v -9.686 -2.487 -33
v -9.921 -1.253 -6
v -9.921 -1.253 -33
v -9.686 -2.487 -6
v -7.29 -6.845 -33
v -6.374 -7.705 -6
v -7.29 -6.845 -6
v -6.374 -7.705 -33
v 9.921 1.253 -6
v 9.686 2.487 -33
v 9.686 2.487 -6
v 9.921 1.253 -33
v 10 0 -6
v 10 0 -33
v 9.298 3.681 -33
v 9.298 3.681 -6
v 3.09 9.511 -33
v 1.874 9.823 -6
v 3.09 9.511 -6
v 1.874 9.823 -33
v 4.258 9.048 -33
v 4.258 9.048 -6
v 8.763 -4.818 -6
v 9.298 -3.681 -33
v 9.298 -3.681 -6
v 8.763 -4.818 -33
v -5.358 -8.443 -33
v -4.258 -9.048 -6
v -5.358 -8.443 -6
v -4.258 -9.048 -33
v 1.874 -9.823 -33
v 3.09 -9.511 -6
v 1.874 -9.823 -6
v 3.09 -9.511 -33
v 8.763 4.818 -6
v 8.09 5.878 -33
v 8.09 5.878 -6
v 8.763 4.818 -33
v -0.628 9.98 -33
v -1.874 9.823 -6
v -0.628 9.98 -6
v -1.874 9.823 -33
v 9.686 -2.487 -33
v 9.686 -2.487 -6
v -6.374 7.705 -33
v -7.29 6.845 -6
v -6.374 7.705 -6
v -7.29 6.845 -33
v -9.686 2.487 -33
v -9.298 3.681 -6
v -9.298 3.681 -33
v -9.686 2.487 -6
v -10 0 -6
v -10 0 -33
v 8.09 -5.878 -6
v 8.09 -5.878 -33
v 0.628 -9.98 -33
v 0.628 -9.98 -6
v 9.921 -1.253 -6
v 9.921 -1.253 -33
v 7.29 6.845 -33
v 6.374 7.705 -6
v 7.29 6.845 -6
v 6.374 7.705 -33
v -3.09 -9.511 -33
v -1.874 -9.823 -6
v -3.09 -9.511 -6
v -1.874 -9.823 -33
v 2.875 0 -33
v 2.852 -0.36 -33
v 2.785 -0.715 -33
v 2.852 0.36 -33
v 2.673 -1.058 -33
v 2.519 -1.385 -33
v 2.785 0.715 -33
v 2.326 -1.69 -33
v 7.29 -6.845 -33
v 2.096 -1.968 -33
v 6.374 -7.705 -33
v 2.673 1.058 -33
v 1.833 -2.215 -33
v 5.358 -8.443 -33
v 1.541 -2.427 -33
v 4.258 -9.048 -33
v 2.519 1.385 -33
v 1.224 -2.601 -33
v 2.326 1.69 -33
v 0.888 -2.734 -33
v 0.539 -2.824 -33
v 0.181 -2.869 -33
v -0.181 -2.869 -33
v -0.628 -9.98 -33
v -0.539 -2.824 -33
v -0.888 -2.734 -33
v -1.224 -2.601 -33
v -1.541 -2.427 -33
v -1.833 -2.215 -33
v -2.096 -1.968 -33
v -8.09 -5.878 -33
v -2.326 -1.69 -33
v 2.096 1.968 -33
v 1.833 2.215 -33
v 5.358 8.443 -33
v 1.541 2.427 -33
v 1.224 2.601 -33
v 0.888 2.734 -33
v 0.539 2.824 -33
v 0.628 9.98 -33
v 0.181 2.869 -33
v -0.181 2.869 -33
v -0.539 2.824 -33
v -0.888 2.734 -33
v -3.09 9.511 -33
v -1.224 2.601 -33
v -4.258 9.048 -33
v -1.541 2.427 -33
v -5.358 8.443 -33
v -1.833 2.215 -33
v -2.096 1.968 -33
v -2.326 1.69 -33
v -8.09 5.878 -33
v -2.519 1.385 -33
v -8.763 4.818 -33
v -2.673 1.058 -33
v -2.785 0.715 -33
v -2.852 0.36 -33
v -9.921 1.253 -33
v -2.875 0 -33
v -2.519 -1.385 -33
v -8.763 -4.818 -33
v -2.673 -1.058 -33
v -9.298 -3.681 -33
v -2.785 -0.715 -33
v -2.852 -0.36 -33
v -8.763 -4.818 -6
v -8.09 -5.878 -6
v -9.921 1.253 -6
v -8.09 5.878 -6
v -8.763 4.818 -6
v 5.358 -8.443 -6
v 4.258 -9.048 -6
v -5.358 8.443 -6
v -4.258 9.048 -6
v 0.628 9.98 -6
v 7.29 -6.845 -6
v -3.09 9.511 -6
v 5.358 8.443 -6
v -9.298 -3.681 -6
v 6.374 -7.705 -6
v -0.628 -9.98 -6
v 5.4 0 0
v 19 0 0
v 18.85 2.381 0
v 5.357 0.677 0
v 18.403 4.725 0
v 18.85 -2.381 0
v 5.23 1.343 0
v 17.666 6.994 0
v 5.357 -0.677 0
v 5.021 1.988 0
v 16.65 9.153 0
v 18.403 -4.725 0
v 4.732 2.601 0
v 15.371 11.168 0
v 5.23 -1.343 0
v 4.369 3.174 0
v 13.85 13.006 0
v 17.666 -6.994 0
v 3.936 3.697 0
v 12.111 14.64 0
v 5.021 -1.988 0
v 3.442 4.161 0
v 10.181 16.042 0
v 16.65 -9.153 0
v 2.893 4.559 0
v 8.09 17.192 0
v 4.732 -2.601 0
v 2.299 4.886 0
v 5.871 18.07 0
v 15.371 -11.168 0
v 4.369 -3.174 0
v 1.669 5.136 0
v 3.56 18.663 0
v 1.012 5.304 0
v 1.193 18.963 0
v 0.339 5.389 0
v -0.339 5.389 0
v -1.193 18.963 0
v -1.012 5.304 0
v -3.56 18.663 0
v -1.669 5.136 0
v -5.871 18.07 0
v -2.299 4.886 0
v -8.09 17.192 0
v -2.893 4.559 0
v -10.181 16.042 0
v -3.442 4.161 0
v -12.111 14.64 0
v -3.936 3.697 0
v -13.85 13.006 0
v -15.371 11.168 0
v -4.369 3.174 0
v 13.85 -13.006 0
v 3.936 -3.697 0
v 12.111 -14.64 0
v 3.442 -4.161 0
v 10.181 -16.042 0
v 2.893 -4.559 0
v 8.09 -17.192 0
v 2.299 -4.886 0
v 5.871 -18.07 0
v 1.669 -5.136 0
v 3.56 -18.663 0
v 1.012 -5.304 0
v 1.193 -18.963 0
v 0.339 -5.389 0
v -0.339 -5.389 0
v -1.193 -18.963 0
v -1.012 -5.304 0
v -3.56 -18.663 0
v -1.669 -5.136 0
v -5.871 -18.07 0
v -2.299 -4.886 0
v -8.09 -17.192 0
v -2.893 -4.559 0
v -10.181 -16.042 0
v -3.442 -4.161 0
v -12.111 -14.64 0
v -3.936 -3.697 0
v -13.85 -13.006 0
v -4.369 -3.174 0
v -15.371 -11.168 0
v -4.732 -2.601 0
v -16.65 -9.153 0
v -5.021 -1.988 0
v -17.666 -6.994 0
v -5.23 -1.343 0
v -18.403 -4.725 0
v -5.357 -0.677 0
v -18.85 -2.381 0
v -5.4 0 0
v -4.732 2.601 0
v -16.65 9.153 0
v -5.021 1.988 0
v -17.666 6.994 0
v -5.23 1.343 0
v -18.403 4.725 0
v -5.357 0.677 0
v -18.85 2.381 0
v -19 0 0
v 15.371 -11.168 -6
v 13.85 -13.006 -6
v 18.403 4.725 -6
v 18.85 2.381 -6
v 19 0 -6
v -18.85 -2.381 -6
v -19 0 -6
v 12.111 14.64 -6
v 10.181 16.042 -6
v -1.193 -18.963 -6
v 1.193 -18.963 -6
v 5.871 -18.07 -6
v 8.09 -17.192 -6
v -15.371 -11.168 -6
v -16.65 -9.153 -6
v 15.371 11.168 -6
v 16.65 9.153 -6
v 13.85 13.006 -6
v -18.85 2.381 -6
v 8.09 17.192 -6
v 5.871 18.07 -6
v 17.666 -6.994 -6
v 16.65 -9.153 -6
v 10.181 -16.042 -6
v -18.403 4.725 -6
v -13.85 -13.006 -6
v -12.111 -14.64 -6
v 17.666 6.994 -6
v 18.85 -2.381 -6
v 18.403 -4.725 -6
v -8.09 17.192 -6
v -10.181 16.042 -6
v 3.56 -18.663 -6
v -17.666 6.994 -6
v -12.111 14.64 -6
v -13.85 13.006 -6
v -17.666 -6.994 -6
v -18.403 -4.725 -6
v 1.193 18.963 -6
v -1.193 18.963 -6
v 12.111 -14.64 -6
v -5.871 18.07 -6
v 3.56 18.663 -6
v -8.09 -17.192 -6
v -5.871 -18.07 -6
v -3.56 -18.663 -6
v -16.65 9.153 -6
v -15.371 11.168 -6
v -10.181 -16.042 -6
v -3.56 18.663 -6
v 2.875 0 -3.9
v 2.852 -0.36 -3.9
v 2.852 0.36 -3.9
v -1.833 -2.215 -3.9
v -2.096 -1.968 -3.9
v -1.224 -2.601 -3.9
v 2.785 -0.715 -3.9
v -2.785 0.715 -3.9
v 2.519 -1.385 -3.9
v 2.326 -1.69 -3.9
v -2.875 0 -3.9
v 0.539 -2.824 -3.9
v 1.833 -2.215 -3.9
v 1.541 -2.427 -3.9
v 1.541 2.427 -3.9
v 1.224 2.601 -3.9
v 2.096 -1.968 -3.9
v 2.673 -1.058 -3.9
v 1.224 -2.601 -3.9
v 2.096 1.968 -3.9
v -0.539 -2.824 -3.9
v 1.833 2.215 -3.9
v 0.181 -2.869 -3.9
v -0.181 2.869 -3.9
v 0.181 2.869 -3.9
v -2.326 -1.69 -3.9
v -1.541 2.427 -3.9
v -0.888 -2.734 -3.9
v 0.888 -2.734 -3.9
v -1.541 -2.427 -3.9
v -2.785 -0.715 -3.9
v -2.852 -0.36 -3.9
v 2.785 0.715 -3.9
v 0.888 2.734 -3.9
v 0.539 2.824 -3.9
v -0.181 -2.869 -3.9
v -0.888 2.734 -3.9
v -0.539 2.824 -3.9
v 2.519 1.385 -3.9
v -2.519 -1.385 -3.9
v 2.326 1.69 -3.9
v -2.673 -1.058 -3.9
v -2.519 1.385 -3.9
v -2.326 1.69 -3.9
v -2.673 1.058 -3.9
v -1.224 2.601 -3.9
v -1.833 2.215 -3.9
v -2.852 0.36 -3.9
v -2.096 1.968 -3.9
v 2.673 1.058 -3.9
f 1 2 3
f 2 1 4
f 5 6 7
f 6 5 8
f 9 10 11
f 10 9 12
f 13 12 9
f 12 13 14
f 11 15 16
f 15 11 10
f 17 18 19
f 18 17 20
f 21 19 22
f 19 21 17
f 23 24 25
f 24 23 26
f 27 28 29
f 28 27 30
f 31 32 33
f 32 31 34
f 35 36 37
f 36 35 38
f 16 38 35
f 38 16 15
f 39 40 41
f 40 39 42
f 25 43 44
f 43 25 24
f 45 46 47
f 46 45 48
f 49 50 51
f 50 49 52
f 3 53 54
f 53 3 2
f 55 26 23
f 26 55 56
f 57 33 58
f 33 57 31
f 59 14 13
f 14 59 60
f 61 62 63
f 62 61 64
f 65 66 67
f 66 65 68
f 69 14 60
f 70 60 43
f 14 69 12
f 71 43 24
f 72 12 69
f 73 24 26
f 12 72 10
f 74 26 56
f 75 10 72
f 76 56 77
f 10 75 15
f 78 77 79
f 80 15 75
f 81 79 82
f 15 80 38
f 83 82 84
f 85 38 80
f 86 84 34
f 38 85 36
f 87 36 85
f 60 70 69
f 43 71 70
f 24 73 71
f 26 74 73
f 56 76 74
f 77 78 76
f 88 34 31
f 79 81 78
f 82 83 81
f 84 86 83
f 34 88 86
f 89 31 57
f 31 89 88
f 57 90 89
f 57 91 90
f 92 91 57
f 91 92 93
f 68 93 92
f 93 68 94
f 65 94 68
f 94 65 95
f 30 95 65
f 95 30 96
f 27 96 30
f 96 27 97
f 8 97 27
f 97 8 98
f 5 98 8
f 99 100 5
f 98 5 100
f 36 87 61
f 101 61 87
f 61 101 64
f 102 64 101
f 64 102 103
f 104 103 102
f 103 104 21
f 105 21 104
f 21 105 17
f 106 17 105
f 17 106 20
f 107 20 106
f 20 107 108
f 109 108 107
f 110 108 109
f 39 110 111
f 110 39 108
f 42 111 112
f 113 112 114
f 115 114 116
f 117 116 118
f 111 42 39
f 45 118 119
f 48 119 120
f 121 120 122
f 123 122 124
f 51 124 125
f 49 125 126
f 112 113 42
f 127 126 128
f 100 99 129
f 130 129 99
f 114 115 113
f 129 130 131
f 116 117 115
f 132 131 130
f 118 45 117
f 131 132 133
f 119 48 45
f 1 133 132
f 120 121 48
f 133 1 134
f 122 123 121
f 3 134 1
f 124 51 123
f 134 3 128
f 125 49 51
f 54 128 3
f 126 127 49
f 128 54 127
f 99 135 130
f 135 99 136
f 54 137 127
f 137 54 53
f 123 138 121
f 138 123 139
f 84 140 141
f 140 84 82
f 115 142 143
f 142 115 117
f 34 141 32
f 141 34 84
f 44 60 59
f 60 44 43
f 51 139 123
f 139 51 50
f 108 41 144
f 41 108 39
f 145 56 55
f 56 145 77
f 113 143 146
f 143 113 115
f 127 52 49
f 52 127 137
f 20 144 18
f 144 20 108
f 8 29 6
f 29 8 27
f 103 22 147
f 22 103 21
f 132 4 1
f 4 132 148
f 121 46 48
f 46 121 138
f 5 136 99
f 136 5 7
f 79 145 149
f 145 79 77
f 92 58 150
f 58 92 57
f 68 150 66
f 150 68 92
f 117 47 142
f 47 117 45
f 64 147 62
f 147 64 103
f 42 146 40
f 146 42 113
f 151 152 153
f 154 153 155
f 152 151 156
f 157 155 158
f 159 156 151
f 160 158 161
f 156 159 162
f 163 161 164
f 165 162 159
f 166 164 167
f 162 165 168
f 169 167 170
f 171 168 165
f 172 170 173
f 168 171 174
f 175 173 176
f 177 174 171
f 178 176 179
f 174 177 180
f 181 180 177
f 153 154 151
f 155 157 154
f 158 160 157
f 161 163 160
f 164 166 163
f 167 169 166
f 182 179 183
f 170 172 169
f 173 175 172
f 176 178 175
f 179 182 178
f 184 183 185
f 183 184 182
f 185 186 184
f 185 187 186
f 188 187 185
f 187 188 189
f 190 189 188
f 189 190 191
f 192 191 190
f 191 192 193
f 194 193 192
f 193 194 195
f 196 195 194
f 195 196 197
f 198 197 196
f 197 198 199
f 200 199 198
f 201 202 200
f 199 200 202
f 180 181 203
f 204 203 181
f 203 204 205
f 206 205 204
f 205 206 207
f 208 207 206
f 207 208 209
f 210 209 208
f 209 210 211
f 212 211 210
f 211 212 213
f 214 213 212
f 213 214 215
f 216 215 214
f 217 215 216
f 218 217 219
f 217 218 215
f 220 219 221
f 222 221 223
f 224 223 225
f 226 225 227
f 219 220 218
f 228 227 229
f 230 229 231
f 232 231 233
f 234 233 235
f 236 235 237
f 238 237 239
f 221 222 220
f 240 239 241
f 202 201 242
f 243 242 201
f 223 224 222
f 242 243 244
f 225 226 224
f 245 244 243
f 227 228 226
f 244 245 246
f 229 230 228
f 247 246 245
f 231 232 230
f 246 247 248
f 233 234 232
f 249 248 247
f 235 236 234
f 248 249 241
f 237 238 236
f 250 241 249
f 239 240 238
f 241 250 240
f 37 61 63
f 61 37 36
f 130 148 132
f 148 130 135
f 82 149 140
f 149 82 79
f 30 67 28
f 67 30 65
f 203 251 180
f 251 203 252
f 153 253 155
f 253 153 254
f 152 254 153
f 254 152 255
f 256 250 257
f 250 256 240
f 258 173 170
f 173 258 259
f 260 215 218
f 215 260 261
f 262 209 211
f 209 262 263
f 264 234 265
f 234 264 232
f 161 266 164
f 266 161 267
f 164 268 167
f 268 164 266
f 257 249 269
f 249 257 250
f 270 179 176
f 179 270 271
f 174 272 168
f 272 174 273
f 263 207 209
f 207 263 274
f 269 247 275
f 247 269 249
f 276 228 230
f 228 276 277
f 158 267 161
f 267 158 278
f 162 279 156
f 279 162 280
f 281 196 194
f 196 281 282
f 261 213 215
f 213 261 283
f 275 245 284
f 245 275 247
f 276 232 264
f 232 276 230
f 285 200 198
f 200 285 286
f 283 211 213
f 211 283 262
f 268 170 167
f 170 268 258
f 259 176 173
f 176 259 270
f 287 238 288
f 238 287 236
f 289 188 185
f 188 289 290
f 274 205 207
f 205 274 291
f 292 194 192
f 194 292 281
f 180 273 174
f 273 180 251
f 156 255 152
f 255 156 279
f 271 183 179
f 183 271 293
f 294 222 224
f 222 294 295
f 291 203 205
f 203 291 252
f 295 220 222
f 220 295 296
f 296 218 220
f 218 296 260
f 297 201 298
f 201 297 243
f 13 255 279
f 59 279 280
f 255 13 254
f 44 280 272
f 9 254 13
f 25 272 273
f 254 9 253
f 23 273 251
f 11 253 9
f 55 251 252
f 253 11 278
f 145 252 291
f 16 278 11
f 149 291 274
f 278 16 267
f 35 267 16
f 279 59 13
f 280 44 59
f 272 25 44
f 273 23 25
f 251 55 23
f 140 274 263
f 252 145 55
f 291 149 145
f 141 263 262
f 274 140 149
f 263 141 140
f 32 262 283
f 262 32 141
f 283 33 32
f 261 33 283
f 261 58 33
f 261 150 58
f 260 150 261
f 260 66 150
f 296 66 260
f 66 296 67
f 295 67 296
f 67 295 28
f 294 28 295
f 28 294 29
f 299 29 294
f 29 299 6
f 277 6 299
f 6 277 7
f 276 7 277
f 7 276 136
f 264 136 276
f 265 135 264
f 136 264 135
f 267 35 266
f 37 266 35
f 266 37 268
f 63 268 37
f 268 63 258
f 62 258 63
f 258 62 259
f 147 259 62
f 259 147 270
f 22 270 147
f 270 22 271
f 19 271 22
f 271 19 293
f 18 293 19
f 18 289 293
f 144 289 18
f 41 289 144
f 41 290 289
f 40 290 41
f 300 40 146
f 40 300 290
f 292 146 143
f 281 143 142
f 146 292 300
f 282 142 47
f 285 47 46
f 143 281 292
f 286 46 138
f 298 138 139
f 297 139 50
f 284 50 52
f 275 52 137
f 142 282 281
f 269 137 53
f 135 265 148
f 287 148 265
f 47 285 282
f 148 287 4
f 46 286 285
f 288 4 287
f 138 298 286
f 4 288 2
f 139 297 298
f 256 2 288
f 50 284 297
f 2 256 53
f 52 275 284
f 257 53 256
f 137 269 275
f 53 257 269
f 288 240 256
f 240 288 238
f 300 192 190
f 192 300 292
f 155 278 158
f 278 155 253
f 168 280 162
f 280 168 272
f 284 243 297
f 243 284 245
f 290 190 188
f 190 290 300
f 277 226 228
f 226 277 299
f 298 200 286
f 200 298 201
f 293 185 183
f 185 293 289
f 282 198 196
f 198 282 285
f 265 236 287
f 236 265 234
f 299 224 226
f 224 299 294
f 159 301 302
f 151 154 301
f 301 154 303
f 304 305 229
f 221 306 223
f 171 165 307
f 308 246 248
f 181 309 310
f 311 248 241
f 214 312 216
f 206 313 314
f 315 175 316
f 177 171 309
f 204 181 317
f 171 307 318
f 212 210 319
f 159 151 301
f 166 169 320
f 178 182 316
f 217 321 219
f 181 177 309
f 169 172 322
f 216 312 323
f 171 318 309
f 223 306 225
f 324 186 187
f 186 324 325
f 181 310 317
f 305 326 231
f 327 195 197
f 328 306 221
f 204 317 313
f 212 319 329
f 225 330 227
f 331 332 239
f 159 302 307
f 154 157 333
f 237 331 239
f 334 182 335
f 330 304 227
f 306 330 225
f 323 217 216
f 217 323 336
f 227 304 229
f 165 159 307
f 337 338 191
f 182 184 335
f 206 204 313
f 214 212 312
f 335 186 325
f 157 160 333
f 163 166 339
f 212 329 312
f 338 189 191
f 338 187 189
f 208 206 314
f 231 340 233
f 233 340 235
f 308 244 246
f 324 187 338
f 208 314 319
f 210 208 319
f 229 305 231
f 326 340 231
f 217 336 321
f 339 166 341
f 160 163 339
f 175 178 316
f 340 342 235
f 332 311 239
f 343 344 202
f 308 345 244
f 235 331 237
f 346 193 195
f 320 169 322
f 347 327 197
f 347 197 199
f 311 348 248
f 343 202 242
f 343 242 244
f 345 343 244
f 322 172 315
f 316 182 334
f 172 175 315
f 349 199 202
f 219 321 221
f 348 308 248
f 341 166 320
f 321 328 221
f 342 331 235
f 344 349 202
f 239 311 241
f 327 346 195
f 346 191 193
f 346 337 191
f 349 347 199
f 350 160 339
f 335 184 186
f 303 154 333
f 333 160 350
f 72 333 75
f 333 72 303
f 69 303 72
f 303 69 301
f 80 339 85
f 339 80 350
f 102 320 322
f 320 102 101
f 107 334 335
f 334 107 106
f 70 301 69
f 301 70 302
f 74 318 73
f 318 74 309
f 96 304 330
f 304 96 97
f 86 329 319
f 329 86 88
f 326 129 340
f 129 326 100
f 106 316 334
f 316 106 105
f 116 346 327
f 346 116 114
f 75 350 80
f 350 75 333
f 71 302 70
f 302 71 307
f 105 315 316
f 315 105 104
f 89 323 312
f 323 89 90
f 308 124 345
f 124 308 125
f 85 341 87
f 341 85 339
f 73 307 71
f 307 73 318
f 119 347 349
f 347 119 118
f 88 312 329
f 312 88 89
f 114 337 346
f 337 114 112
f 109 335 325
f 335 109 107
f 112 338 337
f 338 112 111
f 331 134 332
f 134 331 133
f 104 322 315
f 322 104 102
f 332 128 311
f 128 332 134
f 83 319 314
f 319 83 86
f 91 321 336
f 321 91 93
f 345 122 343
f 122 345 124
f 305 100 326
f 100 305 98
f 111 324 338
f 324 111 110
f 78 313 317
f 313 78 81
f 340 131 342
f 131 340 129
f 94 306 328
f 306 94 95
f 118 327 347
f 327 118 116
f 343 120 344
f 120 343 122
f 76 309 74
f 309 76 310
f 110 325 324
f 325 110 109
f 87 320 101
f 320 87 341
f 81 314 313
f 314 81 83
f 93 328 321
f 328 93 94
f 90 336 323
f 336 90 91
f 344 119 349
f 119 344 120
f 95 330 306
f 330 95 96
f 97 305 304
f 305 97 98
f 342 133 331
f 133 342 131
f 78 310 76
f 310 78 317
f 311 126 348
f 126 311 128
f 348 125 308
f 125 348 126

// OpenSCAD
$fn = 50;


difference() {
	union() {
		translate(v = [0, 0, -33.0000000000]) {
			cylinder(h = 33, r = 10.0000000000);
		}
		translate(v = [0, 0, -6.0000000000]) {
			cylinder(h = 6, r = 19.0000000000);
		}
	}
	union() {
		translate(v = [0, 0, 0]) {
			rotate(a = [0, 0, 0]) {
				difference() {
					union() {
						#translate(v = [0, 0, -33.0000000000]) {
							cylinder(h = 33, r = 2.6000000000);
						}
						#translate(v = [0, 0, -3.9000000000]) {
							cylinder(h = 3.9000000000, r1 = 2.8750000000, r2 = 5.4000000000);
						}
						#translate(v = [0, 0, -33.0000000000]) {
							cylinder(h = 33, r = 2.8750000000);
						}
						#translate(v = [0, 0, -33.0000000000]) {
							cylinder(h = 33, r = 2.6000000000);
						}
					}
					union();
				}
			}
		}
	}
}
